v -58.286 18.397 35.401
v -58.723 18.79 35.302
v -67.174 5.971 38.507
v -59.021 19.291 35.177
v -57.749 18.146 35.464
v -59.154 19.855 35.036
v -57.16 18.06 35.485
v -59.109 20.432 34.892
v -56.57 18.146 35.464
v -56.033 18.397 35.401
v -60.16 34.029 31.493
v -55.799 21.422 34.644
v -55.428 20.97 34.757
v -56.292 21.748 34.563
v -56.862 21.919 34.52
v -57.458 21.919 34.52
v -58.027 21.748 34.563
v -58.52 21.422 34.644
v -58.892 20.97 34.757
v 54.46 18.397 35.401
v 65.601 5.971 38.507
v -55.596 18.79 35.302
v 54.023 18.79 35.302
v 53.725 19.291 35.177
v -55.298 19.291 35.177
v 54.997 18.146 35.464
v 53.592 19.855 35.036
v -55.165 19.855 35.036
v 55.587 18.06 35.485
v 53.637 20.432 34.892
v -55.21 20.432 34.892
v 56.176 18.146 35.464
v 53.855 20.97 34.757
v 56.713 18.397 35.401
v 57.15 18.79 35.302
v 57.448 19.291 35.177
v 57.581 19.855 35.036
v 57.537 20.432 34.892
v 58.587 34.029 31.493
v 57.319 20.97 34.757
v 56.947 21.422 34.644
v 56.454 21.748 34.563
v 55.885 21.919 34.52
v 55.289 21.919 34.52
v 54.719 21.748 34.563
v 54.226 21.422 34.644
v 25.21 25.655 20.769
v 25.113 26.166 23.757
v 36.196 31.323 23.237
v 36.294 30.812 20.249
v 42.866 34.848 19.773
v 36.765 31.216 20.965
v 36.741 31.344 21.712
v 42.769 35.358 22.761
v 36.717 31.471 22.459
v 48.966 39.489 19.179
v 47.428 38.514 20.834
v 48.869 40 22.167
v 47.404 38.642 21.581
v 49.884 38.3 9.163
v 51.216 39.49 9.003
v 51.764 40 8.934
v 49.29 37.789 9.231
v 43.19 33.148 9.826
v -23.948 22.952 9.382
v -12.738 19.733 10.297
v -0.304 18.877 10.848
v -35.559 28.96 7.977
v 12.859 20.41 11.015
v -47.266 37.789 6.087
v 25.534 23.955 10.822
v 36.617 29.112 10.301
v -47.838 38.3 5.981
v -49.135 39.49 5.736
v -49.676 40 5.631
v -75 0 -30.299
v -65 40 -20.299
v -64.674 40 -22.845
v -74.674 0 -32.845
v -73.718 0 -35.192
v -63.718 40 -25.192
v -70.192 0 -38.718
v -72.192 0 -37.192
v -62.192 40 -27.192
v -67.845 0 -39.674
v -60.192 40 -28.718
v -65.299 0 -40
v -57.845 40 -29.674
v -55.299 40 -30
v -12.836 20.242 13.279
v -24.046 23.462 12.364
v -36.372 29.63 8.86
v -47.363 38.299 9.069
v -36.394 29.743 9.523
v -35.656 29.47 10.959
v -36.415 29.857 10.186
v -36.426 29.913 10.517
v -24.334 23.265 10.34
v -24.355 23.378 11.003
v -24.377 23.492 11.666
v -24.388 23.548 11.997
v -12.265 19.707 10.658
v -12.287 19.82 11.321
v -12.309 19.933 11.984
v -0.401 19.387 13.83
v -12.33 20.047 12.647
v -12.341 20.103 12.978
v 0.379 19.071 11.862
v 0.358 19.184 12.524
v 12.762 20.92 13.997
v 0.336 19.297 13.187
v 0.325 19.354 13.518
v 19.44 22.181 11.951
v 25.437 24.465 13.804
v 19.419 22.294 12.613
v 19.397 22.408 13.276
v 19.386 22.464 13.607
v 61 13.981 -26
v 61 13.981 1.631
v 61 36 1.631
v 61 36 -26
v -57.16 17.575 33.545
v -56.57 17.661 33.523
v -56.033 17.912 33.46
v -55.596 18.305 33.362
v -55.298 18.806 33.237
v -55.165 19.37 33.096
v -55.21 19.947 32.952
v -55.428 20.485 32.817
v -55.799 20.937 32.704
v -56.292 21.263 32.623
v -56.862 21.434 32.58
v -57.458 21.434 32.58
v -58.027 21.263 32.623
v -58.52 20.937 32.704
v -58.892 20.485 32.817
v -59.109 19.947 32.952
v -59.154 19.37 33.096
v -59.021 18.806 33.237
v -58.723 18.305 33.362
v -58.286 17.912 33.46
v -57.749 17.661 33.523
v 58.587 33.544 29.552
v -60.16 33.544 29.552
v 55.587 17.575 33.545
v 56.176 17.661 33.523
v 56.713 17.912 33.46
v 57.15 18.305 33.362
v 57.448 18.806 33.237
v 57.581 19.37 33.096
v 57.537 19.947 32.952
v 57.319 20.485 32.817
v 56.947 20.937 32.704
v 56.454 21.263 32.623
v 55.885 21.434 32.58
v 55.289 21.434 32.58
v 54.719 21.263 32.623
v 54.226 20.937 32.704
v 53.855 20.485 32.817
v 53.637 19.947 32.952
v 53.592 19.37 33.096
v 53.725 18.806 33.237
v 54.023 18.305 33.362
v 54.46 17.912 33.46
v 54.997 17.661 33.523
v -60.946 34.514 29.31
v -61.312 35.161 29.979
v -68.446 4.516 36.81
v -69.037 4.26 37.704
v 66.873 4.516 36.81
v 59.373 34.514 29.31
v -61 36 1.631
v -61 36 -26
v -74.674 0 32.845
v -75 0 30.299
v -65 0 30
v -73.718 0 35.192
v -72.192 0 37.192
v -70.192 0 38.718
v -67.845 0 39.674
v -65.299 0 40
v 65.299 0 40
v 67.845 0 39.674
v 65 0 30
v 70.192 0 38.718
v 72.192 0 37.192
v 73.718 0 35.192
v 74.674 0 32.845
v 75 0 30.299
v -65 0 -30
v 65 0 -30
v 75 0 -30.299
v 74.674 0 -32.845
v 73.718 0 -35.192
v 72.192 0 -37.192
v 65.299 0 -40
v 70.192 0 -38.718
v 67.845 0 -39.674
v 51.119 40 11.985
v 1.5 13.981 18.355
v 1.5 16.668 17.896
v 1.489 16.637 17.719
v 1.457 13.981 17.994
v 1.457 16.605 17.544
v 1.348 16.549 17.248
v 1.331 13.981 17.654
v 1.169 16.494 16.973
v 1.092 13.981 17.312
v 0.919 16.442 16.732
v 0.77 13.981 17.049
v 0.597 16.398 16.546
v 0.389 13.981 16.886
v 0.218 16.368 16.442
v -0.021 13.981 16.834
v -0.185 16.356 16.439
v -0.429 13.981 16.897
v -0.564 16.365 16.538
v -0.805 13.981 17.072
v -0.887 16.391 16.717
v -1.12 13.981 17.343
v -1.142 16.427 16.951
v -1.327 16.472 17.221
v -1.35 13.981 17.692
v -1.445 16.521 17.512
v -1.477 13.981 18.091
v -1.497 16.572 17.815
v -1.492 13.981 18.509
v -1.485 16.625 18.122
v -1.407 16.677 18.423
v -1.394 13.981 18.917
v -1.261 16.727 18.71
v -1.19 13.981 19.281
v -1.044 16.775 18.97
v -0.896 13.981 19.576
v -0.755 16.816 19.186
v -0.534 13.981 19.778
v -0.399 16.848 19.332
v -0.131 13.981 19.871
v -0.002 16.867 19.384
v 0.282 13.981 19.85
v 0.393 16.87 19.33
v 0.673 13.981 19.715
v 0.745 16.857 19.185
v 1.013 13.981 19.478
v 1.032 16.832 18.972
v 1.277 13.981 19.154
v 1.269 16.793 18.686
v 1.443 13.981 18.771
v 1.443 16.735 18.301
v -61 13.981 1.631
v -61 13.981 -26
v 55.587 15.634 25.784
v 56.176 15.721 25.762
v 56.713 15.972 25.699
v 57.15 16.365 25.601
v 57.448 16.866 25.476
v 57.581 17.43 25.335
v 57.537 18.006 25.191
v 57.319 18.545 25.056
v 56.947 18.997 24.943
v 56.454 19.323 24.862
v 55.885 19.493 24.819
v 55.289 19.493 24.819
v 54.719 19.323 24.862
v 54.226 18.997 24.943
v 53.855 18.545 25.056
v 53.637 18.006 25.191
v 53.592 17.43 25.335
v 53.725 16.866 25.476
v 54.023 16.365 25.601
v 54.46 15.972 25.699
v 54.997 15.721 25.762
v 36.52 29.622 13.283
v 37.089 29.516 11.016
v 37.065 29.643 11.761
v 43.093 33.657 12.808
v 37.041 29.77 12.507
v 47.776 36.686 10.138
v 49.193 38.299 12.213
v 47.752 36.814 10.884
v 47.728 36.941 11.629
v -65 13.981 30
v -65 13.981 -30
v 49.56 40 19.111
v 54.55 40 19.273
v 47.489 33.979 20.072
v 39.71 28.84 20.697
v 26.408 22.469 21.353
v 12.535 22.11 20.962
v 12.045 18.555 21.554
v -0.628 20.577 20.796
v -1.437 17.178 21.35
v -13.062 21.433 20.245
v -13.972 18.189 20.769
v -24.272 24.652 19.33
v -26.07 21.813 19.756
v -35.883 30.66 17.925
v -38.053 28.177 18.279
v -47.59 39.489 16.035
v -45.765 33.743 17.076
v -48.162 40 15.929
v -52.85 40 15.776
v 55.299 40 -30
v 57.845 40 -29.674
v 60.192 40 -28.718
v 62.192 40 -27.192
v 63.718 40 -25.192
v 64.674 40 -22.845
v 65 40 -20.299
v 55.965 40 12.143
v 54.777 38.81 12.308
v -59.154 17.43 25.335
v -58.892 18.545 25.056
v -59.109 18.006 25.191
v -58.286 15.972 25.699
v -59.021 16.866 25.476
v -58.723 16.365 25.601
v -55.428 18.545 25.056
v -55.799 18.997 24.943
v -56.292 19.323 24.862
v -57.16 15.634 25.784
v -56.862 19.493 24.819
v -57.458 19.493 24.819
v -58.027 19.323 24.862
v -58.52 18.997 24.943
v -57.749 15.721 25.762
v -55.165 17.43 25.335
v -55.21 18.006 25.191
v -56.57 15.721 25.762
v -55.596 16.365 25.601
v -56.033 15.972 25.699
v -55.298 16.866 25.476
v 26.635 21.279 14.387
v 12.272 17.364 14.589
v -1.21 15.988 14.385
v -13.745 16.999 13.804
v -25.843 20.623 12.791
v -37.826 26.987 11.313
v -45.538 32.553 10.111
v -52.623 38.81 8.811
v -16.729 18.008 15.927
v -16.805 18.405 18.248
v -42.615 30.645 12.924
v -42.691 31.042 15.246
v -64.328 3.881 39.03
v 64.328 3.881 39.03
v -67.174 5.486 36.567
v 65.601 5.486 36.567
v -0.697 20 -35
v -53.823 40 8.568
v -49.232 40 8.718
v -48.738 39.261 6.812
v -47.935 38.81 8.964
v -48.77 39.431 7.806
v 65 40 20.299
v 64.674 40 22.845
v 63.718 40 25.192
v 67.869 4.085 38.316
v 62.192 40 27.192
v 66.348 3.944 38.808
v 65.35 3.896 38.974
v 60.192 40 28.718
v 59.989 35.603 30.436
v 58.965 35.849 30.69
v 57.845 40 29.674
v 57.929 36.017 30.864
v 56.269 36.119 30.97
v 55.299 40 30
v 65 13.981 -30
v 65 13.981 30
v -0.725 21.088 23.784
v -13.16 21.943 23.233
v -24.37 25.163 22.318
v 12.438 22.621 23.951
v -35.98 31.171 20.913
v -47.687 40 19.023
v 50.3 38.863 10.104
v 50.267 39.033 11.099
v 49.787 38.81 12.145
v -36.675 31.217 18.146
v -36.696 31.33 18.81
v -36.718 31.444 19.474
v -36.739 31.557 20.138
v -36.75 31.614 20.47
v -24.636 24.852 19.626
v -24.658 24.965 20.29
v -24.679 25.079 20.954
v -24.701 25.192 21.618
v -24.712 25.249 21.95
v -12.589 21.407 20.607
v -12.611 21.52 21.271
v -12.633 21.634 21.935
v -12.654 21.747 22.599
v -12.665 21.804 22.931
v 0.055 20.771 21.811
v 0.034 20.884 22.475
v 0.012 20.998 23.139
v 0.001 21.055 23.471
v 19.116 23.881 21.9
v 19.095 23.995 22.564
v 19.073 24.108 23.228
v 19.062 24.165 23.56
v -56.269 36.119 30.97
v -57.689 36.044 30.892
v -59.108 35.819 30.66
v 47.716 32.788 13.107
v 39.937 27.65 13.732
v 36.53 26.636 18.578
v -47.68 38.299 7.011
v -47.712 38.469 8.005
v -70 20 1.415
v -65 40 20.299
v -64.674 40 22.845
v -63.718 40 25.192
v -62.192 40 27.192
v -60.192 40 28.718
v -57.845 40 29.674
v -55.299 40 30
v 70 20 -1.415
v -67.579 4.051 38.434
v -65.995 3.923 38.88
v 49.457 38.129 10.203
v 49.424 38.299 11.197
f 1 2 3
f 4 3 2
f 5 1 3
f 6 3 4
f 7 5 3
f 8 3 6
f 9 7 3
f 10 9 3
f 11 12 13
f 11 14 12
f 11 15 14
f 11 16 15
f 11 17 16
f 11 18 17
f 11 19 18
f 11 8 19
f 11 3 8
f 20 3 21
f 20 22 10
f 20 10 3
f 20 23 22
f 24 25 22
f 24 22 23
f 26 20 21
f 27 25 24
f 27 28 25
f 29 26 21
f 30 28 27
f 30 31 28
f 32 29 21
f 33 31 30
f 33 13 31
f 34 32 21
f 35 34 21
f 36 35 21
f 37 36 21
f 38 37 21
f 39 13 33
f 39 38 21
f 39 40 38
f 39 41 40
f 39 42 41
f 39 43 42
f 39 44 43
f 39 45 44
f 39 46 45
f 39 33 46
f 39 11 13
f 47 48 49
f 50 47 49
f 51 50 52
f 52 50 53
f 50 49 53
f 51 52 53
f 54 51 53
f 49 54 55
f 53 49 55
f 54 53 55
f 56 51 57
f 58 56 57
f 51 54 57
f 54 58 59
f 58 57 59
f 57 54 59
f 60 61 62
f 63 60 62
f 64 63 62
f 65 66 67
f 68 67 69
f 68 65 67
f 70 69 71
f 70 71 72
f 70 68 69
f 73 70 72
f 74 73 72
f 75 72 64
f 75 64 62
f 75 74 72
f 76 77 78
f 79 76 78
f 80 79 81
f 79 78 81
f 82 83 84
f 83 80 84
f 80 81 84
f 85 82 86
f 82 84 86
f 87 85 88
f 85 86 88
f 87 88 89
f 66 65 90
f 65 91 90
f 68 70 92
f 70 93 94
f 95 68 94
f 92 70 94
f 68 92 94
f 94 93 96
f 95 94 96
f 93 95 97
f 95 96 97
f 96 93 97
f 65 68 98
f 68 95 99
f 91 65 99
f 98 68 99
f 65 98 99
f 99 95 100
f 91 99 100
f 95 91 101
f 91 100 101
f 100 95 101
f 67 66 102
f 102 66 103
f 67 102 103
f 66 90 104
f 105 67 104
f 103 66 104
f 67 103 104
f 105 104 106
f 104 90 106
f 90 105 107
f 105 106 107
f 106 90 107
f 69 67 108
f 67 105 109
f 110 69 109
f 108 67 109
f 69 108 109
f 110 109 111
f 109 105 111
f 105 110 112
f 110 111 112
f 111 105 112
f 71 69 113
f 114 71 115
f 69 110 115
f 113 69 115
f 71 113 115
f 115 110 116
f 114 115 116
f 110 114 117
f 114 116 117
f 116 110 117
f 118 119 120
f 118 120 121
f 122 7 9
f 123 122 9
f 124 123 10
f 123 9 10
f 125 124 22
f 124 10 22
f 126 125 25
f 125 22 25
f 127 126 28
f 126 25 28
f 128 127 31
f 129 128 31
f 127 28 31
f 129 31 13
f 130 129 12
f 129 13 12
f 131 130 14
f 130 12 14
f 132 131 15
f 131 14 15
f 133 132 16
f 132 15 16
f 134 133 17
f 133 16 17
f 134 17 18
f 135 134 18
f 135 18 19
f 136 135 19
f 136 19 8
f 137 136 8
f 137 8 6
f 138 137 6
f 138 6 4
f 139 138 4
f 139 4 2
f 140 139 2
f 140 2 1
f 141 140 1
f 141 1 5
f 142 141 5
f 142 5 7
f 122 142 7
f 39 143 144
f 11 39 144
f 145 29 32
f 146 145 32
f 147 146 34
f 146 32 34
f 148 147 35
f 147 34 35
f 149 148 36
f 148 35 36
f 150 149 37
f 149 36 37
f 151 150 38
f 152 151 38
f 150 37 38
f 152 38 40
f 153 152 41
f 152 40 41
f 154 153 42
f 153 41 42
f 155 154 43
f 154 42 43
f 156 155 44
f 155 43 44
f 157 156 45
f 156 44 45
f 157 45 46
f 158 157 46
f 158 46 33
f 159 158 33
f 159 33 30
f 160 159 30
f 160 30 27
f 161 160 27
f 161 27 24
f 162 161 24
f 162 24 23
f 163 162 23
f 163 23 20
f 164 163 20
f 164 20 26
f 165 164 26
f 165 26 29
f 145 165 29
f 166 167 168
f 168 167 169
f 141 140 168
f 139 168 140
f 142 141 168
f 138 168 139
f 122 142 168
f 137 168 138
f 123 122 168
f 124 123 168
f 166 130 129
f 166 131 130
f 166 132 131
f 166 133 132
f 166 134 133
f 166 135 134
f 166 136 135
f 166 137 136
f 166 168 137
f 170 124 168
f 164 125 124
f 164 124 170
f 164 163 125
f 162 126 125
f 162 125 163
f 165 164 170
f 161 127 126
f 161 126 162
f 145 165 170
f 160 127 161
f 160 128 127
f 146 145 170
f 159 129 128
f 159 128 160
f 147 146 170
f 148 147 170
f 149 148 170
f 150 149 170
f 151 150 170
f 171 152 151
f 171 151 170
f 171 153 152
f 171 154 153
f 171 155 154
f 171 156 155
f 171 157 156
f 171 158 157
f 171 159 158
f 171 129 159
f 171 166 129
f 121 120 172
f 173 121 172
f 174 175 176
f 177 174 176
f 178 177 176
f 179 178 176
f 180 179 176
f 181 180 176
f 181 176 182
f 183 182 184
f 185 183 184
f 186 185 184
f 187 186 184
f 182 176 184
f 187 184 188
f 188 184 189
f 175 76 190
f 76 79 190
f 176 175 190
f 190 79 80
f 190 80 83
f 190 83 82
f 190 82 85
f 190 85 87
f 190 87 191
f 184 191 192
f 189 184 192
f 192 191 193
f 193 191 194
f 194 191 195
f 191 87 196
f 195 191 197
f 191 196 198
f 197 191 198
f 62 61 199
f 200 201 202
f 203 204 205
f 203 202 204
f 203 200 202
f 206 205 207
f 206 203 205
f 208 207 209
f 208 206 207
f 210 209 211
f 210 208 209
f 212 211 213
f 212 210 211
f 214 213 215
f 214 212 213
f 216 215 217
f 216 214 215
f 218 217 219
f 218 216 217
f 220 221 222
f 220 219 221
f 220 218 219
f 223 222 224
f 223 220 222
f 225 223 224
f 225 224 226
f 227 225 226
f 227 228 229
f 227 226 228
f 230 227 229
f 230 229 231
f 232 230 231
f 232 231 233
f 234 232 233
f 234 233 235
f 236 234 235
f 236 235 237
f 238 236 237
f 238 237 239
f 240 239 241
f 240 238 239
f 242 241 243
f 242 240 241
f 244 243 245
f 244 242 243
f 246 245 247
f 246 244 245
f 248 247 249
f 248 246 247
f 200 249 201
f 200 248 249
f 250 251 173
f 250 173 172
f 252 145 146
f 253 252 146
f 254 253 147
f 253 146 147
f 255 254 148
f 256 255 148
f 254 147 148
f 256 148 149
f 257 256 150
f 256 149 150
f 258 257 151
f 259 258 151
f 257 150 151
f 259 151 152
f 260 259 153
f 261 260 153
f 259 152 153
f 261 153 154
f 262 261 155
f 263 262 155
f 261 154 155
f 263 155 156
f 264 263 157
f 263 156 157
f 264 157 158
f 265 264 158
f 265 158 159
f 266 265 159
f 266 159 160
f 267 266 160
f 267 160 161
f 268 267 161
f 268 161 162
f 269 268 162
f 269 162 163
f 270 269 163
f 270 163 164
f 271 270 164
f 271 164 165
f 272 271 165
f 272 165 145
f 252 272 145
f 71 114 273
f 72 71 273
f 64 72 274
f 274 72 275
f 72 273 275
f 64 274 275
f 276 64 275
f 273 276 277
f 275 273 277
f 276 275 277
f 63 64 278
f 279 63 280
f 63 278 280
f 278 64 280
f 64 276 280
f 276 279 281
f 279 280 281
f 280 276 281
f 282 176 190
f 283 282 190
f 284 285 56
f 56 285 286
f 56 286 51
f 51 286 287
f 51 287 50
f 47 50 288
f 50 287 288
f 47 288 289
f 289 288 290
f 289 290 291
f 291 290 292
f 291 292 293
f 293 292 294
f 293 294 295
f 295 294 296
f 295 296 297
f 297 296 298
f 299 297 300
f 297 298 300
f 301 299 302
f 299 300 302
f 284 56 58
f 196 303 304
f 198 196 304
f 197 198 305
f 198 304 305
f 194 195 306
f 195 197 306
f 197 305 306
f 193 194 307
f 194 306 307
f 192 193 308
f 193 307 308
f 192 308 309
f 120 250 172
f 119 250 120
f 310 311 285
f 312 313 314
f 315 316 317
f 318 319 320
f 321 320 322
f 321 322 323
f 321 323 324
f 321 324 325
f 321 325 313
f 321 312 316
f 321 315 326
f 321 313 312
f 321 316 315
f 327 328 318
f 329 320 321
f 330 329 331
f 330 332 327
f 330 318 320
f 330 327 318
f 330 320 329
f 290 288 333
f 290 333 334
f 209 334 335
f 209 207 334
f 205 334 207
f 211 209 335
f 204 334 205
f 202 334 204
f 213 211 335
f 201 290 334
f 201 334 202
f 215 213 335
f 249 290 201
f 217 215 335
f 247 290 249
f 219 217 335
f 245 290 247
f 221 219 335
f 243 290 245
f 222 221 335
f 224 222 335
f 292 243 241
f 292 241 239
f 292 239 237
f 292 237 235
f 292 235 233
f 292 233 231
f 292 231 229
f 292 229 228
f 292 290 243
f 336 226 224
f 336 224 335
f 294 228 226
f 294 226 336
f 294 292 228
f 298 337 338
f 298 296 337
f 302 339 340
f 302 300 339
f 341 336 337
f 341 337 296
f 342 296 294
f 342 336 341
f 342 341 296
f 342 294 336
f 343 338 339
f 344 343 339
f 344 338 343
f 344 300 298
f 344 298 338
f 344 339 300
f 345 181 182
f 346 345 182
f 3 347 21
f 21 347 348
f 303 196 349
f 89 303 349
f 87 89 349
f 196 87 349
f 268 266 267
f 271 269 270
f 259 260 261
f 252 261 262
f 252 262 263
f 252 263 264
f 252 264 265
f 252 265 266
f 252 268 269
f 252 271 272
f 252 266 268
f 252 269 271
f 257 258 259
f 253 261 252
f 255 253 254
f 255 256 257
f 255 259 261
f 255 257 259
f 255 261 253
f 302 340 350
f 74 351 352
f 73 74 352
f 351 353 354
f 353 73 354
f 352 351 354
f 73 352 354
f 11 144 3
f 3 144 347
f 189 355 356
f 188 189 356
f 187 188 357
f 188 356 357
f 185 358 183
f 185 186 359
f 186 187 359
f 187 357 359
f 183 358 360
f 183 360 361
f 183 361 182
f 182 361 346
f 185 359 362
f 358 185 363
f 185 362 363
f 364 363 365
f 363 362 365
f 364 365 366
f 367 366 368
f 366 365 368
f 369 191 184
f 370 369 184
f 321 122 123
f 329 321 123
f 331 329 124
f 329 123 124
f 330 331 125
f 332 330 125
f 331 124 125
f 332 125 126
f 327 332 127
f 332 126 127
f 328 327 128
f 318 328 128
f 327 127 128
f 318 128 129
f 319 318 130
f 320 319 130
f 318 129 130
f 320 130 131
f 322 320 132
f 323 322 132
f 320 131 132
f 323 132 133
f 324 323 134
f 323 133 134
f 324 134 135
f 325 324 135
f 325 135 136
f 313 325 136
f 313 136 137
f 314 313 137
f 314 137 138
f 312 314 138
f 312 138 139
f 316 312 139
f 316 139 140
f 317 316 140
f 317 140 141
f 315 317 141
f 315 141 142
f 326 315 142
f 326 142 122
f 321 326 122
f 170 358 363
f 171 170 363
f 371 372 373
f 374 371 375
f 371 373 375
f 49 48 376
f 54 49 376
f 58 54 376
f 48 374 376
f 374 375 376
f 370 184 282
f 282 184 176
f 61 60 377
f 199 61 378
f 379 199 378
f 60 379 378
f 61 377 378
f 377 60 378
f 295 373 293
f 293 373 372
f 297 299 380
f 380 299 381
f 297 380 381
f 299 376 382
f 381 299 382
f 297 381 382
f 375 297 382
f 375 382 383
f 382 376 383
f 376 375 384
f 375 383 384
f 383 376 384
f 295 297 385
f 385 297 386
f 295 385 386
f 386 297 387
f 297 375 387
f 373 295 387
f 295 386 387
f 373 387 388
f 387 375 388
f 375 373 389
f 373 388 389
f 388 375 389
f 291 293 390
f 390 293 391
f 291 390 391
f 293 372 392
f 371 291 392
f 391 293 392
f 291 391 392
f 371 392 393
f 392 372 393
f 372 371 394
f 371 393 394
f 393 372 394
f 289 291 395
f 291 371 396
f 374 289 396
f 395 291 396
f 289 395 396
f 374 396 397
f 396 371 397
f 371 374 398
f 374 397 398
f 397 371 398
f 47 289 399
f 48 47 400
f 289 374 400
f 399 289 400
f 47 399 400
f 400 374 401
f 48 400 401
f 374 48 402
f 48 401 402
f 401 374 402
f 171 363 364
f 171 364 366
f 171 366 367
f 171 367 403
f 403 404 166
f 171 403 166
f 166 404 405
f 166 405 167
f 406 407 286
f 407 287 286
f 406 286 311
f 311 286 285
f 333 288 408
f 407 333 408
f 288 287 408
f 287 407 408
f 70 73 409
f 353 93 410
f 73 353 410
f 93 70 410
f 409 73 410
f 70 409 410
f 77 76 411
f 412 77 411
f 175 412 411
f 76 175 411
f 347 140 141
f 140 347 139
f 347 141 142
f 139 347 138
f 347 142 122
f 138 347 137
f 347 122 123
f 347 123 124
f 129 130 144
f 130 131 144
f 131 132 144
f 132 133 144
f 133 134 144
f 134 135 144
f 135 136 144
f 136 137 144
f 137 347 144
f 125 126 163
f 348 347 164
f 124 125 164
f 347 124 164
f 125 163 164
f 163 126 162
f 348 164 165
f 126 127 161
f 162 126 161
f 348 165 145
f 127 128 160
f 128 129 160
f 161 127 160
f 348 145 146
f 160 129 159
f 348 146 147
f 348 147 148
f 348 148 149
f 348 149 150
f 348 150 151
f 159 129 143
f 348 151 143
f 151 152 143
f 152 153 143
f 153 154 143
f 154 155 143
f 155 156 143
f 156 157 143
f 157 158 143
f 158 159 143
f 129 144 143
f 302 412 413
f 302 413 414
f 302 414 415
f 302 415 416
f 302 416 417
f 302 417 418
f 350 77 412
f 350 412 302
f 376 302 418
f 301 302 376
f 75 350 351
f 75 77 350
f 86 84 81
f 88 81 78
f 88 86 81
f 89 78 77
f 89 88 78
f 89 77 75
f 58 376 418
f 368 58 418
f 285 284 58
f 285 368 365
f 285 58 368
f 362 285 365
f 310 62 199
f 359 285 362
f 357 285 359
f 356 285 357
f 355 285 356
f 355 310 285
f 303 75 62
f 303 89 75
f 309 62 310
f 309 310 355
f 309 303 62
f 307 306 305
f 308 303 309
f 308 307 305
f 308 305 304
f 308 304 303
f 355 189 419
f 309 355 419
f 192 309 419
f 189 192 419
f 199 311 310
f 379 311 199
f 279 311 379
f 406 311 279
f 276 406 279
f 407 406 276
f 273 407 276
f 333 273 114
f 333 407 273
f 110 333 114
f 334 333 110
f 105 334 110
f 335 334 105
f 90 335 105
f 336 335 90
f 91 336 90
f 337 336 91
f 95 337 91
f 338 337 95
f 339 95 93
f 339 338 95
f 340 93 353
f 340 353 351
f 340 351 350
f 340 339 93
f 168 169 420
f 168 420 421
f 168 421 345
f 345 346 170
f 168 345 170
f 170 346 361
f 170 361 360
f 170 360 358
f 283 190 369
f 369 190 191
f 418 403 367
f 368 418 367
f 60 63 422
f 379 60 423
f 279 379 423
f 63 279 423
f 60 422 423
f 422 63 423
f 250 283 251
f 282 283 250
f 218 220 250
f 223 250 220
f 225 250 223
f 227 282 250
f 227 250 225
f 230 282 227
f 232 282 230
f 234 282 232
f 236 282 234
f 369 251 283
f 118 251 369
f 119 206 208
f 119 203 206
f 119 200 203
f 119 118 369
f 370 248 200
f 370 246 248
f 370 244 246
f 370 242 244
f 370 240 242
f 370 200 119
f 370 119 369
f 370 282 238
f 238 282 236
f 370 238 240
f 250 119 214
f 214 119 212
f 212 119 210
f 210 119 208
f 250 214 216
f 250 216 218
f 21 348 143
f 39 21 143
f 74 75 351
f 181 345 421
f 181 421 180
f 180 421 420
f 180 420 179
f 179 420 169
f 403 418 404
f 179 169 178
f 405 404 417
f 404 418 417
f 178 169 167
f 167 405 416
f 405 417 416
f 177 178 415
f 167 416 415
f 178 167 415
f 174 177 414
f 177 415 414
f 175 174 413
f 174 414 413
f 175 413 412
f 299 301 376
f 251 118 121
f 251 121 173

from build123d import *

# Parameters (mm, degrees)
CUT_EXTRUDE8_DEPTH  = 2
CUT_EXTRUDE8_DRAFT  = -30.000000000000068
CAVITY1_START       = -27.005751745
CAVITY1_DEPTH       = 13.13
CAVITY1_START_2     = -23.972790864
CAVITY1_2_DEPTH     = 7.07
CUT_EXTRUDE11_DEPTH = 13.980872
CUT_EXTRUDE12_DEPTH = 22.019128
CAVITY2_START       = 8.727473307
CAVITY2_OUTLINE_R   = 1.5
CAVITY2_DEPTH       = 10.107211823
BOSS_EXTRUDE1_DEPTH = 2
FILLET1_R           = 10
SKETCH14_R          = 2.0000000000000027
CUT_EXTRUDE16_DEPTH = 10


with BuildPart() as part:
    # Sketch2 → Loft1 section 0
    with BuildSketch(Plane(origin=(0, 40, 0), x_dir=(1, 0, 0), z_dir=(0, 1, 0))):
        with BuildLine():
            Line((-64.99999999999999, 30), (-64.99999999999999, -30))
            Line((-64.99999999999999, -30), (65.00000000000001, -30.000000000000007))
            Line((65.00000000000001, -30.000000000000007), (65.00000000000003, 30))
            Line((65.00000000000003, 30), (-64.99999999999999, 30))
        make_face()
    # Sketch1 → Loft1 section 1
    with BuildSketch(Plane(origin=(0, 0, 0), x_dir=(1, 0, 0), z_dir=(0, 1, 0))):
        with BuildLine():
            Line((-74.99999999999999, 40), (75.00000000000001, 40))
            Line((75.00000000000001, 40), (75.00000000000001, -40))
            Line((75.00000000000001, -40), (-74.99999999999999, -40))
            Line((-74.99999999999999, -40), (-74.99999999999999, 40))
        make_face()
    loft()


with BuildPart() as cut_extrude8_tool:
    # Sketch3 → Cut-Extrude8 (with draft: the straight prism first)
    with BuildSketch(Plane(origin=(0, 9.411764705882353, 37.64705882352941), x_dir=(1, 0, 0), z_dir=(0, 0.24253562503633302, 0.9701425001453319))):
        Polygon((-69.91389145643446, -5.701425001453311), (68.34097968479703, -5.701425001453311), (60.2812646850877, 27.529631254723288), (-61.85417645672512, 27.529631254723288), align=None)
    extrude(amount=-CUT_EXTRUDE8_DEPTH)
    # Cut-Extrude8: the draft: its side faces are tilted about the plane it starts from
    cut_extrude8_sides = [cut_extrude8_tool.faces().sort_by_distance(p)[0] for p in [
        (-0.786455886, 3.638034376, 38.059715),
        (64.311122185, 19.757464375, 34.0298575),
        (-0.786455886, 35.876894374, 30),
        (-65.884033957, 19.757464375, 34.0298575),
    ]]
    draft(cut_extrude8_sides, Plane(origin=(0, 9.411764705882353, 37.64705882352941), x_dir=(1, 0, 0), z_dir=(0, 0.24253562503633302, 0.9701425001453319)), CUT_EXTRUDE8_DRAFT)


with BuildPart() as part_1:
    add(part.part)

    # Cut-Extrude8: cut by cut_extrude8_tool
    add(cut_extrude8_tool.part, mode=Mode.SUBTRACT)

    # Cavity1: read off the stored shape, not the designer's step
    # Cavity1 outline → Cavity1 (cut)
    with BuildSketch(Plane(origin=(0, 0, 0), x_dir=(0.9994854140769153, 0.005403413308691594, 0.03161819368833113), z_dir=(0.032076580982039964, -0.16836684655668904, -0.9852023639501983)).offset(CAVITY1_START)):
        with BuildLine():
            add(Edge.make_bspline(
                [(50.355235298, -36.209129734), (50.805312989652776, -36.60371201438724), (51.24948658178987, -37.00382899801401), (51.687403264, -37.409437974)],
                knots=[0.11211566120277261, 0.11211566120277261, 0.11211566120277261, 0.11211566120277261, 0.1192150960387556, 0.1192150960387556, 0.1192150960387556, 0.1192150960387556], degree=3))
            add(Edge.make_bspline(
                [(49.761044253, -35.694333688), (49.96021870095069, -35.864870240989205), (50.158292235749954, -36.036470115873016), (50.355235298, -36.209129734)],
                knots=[0.10900912101711563, 0.10900912101711563, 0.10900912101711563, 0.10900912101711563, 0.11211566120248272, 0.11211566120248272, 0.11211566120248272, 0.11211566120248272], degree=3))
            Line((49.761044253, -35.694333688), (-46.845091182, -36.223904348))
            add(Edge.make_bspline(
                [(-47.417110338, -36.745093263), (-47.22719353968011, -36.57064858623464), (-47.03651846748558, -36.39691770953557), (-46.845091182, -36.223904348)],
                knots=[0.6864352775247219, 0.6864352775247219, 0.6864352775247219, 0.6864352775247219, 0.6894561696163187, 0.6894561696163187, 0.6894561696163187, 0.6894561696163187], degree=3))
            add(Edge.make_bspline(
                [(-48.715193267, -37.959819881), (-48.28655788769419, -37.55116650190169), (-47.853839012104416, -37.14624257172727), (-47.417110338, -36.745093263)],
                knots=[0.6794884976438031, 0.6794884976438031, 0.6794884976438031, 0.6794884976438031, 0.6864352775247208, 0.6864352775247208, 0.6864352775247208, 0.6864352775247208], degree=3))
            add(Edge.make_bspline(
                [(-49.256344045, -38.4798281), (-49.07669321747152, -38.3058284511273), (-48.89630777162405, -38.1324912420223), (-48.715193267, -37.959819881)],
                knots=[0.6765532229119626, 0.6765532229119626, 0.6765532229119626, 0.6765532229119626, 0.6794884976438018, 0.6794884976438018, 0.6794884976438018, 0.6794884976438018], degree=3))
            Line((-49.256344045, -38.4798281), (52.235908996, -37.92347297))
            add(Edge.make_bspline(
                [(51.687403264, -37.409437974), (51.87135121860002, -37.57981499870691), (52.05419517867322, -37.751161052615934), (52.235908996, -37.92347297)],
                knots=[0.11921509604045627, 0.11921509604045627, 0.11921509604045627, 0.11921509604045627, 0.12219723070068893, 0.12219723070068893, 0.12219723070068893, 0.12219723070068893], degree=3))
        make_face()
        with BuildLine():
            Line((-46.845091182, -36.223904348), (49.761044253, -35.694333688))
            add(Edge.make_bspline(
                [(25.992562022, -21.789918914), (27.97241774927912, -22.554509718421677), (31.86147330768567, -24.21157111866771), (39.53560235227695, -28.149479207087097), (45.484692945993835, -32.12546362556011), (49.27067858554398, -35.27447425551093), (49.761044253, -35.694333688)],
                knots=[0.00014231695830879, 0.00014231695830879, 0.00014231695830879, 0.00014231695830879, 0.0254469495955715, 0.0507515822328341, 0.101360847507359, 0.10900912101711563, 0.10900912101711563, 0.10900912101711563, 0.10900912101711563], degree=3))
            add(Edge.make_bspline(
                [(-46.845091182, -36.223904348), (-46.417616962089184, -35.837550063290415), (-42.751252764049724, -32.583109122216364), (-35.3485175182261, -26.949503677086305), (-25.880244562699968, -21.801451670333996), (-17.951241239258827, -18.93979547800609), (-9.812820325211526, -17.037792218072678), (0.8369249515851553, -16.406292550348134), (11.588276700291972, -17.743375586597505), (19.969053301580413, -19.783463884974942), (23.99478785870199, -21.07345105396366), (25.992562022, -21.789918914)],
                knots=[0.6894561696163187, 0.6894561696163187, 0.6894561696163187, 0.6894561696163187, 0.696202091394543, 0.746811356669069, 0.797420621943594, 0.822725254580857, 0.84802988721812, 0.898639152492646, 0.949248417767171, 0.974553050404434, 0.999857683041697, 0.999857683041697, 0.999857683041697, 0.999857683041697], degree=3))
        make_face()
    extrude(amount=CAVITY1_DEPTH, mode=Mode.SUBTRACT)

    # Cavity1 2 outline → Cavity1 2 (cut)
    with BuildSketch(Plane(origin=(0, 0, 0), x_dir=(0.9994854140769153, 0.005403413308691594, 0.03161819368833113), z_dir=(0.032076580982039964, -0.16836684655668904, -0.9852023639501983)).offset(CAVITY1_START_2)):
        with BuildLine():
            add(Edge.make_bspline(
                [(27.191342809, -18.550931312), (37.35377153585318, -22.470993201582978), (47.403872591056825, -28.360509477424444), (55.347576783, -36.181762968)],
                knots=[0, 0, 0, 0, 0.12686867431457954, 0.12686867431457954, 0.12686867431457954, 0.12686867431457954], degree=3))
            add(Edge.make_bspline(
                [(27.191342809, -18.550931312), (13.674487738389166, -13.697438126784096), (-12.232516906914503, -10.152698462282672), (-38.21904867543959, -24.333826303887037), (-48.959817642205, -33.642555584421366), (-52.107843822, -36.770806684)],
                knots=[0, 0, 0, 0, 0.167280310890927, 0.277652873911495, 0.3281558088454397, 0.3281558088454397, 0.3281558088454397, 0.3281558088454397], degree=3))
            Line((-52.107843822, -36.770806684), (-47.417110338, -36.745093263))
            add(Edge.make_bspline(
                [(-47.417110338, -36.745093263), (-47.22719353968011, -36.57064858623464), (-47.03651846748558, -36.39691770953557), (-46.845091182, -36.223904348)],
                knots=[0.6864352775247219, 0.6864352775247219, 0.6864352775247219, 0.6864352775247219, 0.6894561696163187, 0.6894561696163187, 0.6894561696163187, 0.6894561696163187], degree=3))
            add(Edge.make_bspline(
                [(-46.845091182, -36.223904348), (-46.417616962089184, -35.837550063290415), (-42.751252764049724, -32.583109122216364), (-35.3485175182261, -26.949503677086305), (-25.880244562699968, -21.801451670333996), (-17.951241239258827, -18.93979547800609), (-9.812820325211526, -17.037792218072678), (0.8369249515851553, -16.406292550348134), (11.588276700291972, -17.743375586597505), (19.969053301580413, -19.783463884974942), (23.99478785870199, -21.07345105396366), (25.992562022, -21.789918914)],
                knots=[0.6894561696163187, 0.6894561696163187, 0.6894561696163187, 0.6894561696163187, 0.696202091394543, 0.746811356669069, 0.797420621943594, 0.822725254580857, 0.84802988721812, 0.898639152492646, 0.949248417767171, 0.974553050404434, 0.999857683041697, 0.999857683041697, 0.999857683041697, 0.999857683041697], degree=3))
            add(Edge.make_bspline(
                [(25.992562022, -21.789918914), (27.97241774927912, -22.554509718421677), (31.86147330768567, -24.21157111866771), (39.53560235227695, -28.149479207087097), (45.484692945993835, -32.12546362556011), (49.27067858554398, -35.27447425551093), (49.761044253, -35.694333688)],
                knots=[0.00014231695830879, 0.00014231695830879, 0.00014231695830879, 0.00014231695830879, 0.0254469495955715, 0.0507515822328341, 0.101360847507359, 0.10900912101711563, 0.10900912101711563, 0.10900912101711563, 0.10900912101711563], degree=3))
            add(Edge.make_bspline(
                [(49.761044253, -35.694333688), (49.96021870095069, -35.864870240989205), (50.158292235749954, -36.036470115873016), (50.355235298, -36.209129734)],
                knots=[0.10900912101711563, 0.10900912101711563, 0.10900912101711563, 0.10900912101711563, 0.11211566120248272, 0.11211566120248272, 0.11211566120248272, 0.11211566120248272], degree=3))
            Line((50.355235298, -36.209129734), (55.347576783, -36.181762968))
        make_face()
        with BuildLine():
            add(Edge.make_bspline(
                [(55.347576783, -36.181762968), (55.74919687256925, -36.577192159097784), (56.145432715262274, -36.97755914211079), (56.53602661, -37.382859043)],
                knots=[0.1268686743145864, 0.1268686743145864, 0.1268686743145864, 0.1268686743145864, 0.13328293736502136, 0.13328293736502136, 0.13328293736502136, 0.13328293736502136], degree=3))
            Line((55.347576783, -36.181762968), (50.355235298, -36.209129734))
            add(Edge.make_bspline(
                [(50.355235298, -36.209129734), (50.805312989652776, -36.60371201438724), (51.24948658178987, -37.00382899801401), (51.687403264, -37.409437974)],
                knots=[0.11211566120277261, 0.11211566120277261, 0.11211566120277261, 0.11211566120277261, 0.1192150960387556, 0.1192150960387556, 0.1192150960387556, 0.1192150960387556], degree=3))
            Line((51.687403264, -37.409437974), (56.53602661, -37.382859043))
        make_face()
        with BuildLine():
            Line((-47.417110338, -36.745093263), (-52.107843823, -36.770806685))
            add(Edge.make_bspline(
                [(-52.107843823, -36.770806685), (-52.511739115098145, -37.17216481243256), (-52.91195079030909, -37.57691398832324), (-53.308422277, -37.984998807)],
                knots=[0.3281558088541084, 0.3281558088541084, 0.3281558088541084, 0.3281558088541084, 0.3346353920875178, 0.3346353920875178, 0.3346353920875178, 0.3346353920875178], degree=3))
            Line((-53.308422277, -37.984998807), (-48.715193267, -37.959819881))
            add(Edge.make_bspline(
                [(-48.715193267, -37.959819881), (-48.28655788769419, -37.55116650190169), (-47.853839012104416, -37.14624257172727), (-47.417110338, -36.745093263)],
                knots=[0.6794884976438031, 0.6794884976438031, 0.6794884976438031, 0.6794884976438031, 0.6864352775247208, 0.6864352775247208, 0.6864352775247208, 0.6864352775247208], degree=3))
        make_face()
    extrude(amount=CAVITY1_2_DEPTH, mode=Mode.SUBTRACT)

    # Sketch4 → Cut-Extrude11 (cut)
    with BuildSketch(Plane.XZ):
        Polygon((-64.99999999999999, -30), (65.00000000000003, -30), (65.00000000000001, 30.000000000000007), (-64.99999999999999, 30), align=None)
    extrude(amount=-CUT_EXTRUDE11_DEPTH, mode=Mode.SUBTRACT)

    # Sketch7 → Cut-Extrude12 (cut)
    with BuildSketch(Plane.XZ.offset(-13.980871517386877)):
        Polygon((-60.99999999999998, 1.630963903200694), (61.00000000000003, 1.630963903200694), (61.00000000000003, -26.000000000000007), (-60.999999999999986, -26.000000000000007), align=None)
    extrude(amount=-CUT_EXTRUDE12_DEPTH, mode=Mode.SUBTRACT)

    # Cavity2: read off the stored shape, not the designer's step
    # Cavity2 outline → Cavity2 (cut)
    with BuildSketch(Plane(origin=(0, 0, 0), x_dir=(1, 0, 0), z_dir=(0, 0.9857095962326692, -0.16845353037211303)).offset(CAVITY2_START)):
        with Locations((0, -20.448313278)):
            Circle(CAVITY2_OUTLINE_R)
    extrude(amount=CAVITY2_DEPTH, mode=Mode.SUBTRACT)

    # Fillet1
    # the kernel refuses this fillet: 10 mm, written as the material it takes off along each edge
    with BuildSketch(Plane(origin=(59.44444444444446, 62.222222222222214, 24.444444444444457), x_dir=(0.0571661950475022, -0.2286647801900118, -0.97182531580755), z_dir=(0.23570226039551587, -0.9428090415820635, 0.2357022603955157))) as fillet1_piece_1:
        with BuildLine():
            CenterArc((FILLET1_R * 0.942809041582, -FILLET1_R), FILLET1_R, 90.00000000000004, 86.62771331656596)
            Line((-FILLET1_R * 0.0554593553872, -FILLET1_R * 0.941176470588), (0, 0))
            Line((0, 0), (FILLET1_R * 0.942809041582, -1e-17))
        make_face()
    extrude(amount=89.56685895029601, mode=Mode.SUBTRACT)
    with BuildSketch(Plane(origin=(59.44444444444448, 62.22222222222224, -24.44444444444444), x_dir=(-0.9718253158075503, -0.2286647801900115, -0.05716619504750306), z_dir=(0.23570226039551553, -0.9428090415820635, -0.23570226039551587))) as fillet1_piece_2:
        with BuildLine():
            CenterArc((FILLET1_R * 0.942809041582, -FILLET1_R), FILLET1_R, 89.99999999999999, 86.6277133165661)
            Line((-FILLET1_R * 0.0554593553872, -FILLET1_R * 0.941176470588), (0, 0))
            Line((0, 0), (FILLET1_R * 0.942809041582, -3e-17))
        make_face()
    extrude(amount=89.56685895029607, mode=Mode.SUBTRACT)
    with BuildSketch(Plane(origin=(-59.44444444444442, 62.22222222222225, -24.444444444444436), x_dir=(-0.05716619504750242, -0.22866478019001193, 0.97182531580755), z_dir=(-0.23570226039551584, -0.9428090415820634, -0.23570226039551584))) as fillet1_piece_3:
        with BuildLine():
            CenterArc((FILLET1_R * 0.942809041582, -FILLET1_R), FILLET1_R, 90.00000000000004, 86.62771331656613)
            Line((-FILLET1_R * 0.0554593553872, -FILLET1_R * 0.941176470588), (0, 0))
            Line((0, 0), (FILLET1_R * 0.942809041582, 7e-17))
        make_face()
    extrude(amount=89.56685895029608, mode=Mode.SUBTRACT)
    with BuildSketch(Plane(origin=(-59.44444444444443, 62.22222222222223, 24.444444444444443), x_dir=(-0.05716619504750224, -0.228664780190012, -0.97182531580755), z_dir=(-0.23570226039551584, -0.9428090415820634, 0.23570226039551584))) as fillet1_piece_4:
        with BuildLine():
            CenterArc((FILLET1_R * 0.942809041582, FILLET1_R), FILLET1_R, 183.37228668343386, 86.62771331656609)
            Line((-FILLET1_R * 0.0554593553872, FILLET1_R * 0.941176470588), (0, 0))
            Line((0, 0), (FILLET1_R * 0.942809041582, -1.2e-16))
        make_face()
    extrude(amount=89.56685895029604, mode=Mode.SUBTRACT)


with BuildPart() as body_2:
    # Sketch10 → Boss-Extrude1 (new body)
    with BuildSketch(Plane(origin=(0, 8.926693455809687, 35.706773823238755), x_dir=(1, 0, 0), z_dir=(0, 0.242535625036333, 0.9701425001453319))):
        Polygon((-67.17413125216545, -3.5467244630740566), (65.60121948052803, -3.546724463074049), (58.58668776450257, 25.374930716344036), (-60.15959953614, 25.374930716344014), align=None)
    extrude(amount=BOSS_EXTRUDE1_DEPTH)


with BuildPart() as cut_extrude16_tool:
    # Sketch14 → Cut-Extrude16 (new body)
    with BuildSketch(Plane(origin=(0, 9.411764705882353, 37.64705882352941), x_dir=(1, 0, 0), z_dir=(0, 0.24253562503633302, 0.9701425001453319))):
        with Locations(Location((-57.15959953614, 10.91410312663499, 0), (0, 0, 270))):
            Circle(SKETCH14_R)
        with Locations(Location((55.58668776450257, 10.914103126634998, 0), (0, 0, 270))):
            Circle(SKETCH14_R)
    extrude(amount=-CUT_EXTRUDE16_DEPTH)


with BuildPart() as part_2:
    add(part_1.part)

    # Cut-Extrude16: cut by cut_extrude16_tool
    add(cut_extrude16_tool.part, mode=Mode.SUBTRACT)


with BuildPart() as body_2_1:
    add(body_2.part)

    # Cut-Extrude16: cut by cut_extrude16_tool
    add(cut_extrude16_tool.part, mode=Mode.SUBTRACT)


solid = Compound([part_2.part, body_2_1.part])
